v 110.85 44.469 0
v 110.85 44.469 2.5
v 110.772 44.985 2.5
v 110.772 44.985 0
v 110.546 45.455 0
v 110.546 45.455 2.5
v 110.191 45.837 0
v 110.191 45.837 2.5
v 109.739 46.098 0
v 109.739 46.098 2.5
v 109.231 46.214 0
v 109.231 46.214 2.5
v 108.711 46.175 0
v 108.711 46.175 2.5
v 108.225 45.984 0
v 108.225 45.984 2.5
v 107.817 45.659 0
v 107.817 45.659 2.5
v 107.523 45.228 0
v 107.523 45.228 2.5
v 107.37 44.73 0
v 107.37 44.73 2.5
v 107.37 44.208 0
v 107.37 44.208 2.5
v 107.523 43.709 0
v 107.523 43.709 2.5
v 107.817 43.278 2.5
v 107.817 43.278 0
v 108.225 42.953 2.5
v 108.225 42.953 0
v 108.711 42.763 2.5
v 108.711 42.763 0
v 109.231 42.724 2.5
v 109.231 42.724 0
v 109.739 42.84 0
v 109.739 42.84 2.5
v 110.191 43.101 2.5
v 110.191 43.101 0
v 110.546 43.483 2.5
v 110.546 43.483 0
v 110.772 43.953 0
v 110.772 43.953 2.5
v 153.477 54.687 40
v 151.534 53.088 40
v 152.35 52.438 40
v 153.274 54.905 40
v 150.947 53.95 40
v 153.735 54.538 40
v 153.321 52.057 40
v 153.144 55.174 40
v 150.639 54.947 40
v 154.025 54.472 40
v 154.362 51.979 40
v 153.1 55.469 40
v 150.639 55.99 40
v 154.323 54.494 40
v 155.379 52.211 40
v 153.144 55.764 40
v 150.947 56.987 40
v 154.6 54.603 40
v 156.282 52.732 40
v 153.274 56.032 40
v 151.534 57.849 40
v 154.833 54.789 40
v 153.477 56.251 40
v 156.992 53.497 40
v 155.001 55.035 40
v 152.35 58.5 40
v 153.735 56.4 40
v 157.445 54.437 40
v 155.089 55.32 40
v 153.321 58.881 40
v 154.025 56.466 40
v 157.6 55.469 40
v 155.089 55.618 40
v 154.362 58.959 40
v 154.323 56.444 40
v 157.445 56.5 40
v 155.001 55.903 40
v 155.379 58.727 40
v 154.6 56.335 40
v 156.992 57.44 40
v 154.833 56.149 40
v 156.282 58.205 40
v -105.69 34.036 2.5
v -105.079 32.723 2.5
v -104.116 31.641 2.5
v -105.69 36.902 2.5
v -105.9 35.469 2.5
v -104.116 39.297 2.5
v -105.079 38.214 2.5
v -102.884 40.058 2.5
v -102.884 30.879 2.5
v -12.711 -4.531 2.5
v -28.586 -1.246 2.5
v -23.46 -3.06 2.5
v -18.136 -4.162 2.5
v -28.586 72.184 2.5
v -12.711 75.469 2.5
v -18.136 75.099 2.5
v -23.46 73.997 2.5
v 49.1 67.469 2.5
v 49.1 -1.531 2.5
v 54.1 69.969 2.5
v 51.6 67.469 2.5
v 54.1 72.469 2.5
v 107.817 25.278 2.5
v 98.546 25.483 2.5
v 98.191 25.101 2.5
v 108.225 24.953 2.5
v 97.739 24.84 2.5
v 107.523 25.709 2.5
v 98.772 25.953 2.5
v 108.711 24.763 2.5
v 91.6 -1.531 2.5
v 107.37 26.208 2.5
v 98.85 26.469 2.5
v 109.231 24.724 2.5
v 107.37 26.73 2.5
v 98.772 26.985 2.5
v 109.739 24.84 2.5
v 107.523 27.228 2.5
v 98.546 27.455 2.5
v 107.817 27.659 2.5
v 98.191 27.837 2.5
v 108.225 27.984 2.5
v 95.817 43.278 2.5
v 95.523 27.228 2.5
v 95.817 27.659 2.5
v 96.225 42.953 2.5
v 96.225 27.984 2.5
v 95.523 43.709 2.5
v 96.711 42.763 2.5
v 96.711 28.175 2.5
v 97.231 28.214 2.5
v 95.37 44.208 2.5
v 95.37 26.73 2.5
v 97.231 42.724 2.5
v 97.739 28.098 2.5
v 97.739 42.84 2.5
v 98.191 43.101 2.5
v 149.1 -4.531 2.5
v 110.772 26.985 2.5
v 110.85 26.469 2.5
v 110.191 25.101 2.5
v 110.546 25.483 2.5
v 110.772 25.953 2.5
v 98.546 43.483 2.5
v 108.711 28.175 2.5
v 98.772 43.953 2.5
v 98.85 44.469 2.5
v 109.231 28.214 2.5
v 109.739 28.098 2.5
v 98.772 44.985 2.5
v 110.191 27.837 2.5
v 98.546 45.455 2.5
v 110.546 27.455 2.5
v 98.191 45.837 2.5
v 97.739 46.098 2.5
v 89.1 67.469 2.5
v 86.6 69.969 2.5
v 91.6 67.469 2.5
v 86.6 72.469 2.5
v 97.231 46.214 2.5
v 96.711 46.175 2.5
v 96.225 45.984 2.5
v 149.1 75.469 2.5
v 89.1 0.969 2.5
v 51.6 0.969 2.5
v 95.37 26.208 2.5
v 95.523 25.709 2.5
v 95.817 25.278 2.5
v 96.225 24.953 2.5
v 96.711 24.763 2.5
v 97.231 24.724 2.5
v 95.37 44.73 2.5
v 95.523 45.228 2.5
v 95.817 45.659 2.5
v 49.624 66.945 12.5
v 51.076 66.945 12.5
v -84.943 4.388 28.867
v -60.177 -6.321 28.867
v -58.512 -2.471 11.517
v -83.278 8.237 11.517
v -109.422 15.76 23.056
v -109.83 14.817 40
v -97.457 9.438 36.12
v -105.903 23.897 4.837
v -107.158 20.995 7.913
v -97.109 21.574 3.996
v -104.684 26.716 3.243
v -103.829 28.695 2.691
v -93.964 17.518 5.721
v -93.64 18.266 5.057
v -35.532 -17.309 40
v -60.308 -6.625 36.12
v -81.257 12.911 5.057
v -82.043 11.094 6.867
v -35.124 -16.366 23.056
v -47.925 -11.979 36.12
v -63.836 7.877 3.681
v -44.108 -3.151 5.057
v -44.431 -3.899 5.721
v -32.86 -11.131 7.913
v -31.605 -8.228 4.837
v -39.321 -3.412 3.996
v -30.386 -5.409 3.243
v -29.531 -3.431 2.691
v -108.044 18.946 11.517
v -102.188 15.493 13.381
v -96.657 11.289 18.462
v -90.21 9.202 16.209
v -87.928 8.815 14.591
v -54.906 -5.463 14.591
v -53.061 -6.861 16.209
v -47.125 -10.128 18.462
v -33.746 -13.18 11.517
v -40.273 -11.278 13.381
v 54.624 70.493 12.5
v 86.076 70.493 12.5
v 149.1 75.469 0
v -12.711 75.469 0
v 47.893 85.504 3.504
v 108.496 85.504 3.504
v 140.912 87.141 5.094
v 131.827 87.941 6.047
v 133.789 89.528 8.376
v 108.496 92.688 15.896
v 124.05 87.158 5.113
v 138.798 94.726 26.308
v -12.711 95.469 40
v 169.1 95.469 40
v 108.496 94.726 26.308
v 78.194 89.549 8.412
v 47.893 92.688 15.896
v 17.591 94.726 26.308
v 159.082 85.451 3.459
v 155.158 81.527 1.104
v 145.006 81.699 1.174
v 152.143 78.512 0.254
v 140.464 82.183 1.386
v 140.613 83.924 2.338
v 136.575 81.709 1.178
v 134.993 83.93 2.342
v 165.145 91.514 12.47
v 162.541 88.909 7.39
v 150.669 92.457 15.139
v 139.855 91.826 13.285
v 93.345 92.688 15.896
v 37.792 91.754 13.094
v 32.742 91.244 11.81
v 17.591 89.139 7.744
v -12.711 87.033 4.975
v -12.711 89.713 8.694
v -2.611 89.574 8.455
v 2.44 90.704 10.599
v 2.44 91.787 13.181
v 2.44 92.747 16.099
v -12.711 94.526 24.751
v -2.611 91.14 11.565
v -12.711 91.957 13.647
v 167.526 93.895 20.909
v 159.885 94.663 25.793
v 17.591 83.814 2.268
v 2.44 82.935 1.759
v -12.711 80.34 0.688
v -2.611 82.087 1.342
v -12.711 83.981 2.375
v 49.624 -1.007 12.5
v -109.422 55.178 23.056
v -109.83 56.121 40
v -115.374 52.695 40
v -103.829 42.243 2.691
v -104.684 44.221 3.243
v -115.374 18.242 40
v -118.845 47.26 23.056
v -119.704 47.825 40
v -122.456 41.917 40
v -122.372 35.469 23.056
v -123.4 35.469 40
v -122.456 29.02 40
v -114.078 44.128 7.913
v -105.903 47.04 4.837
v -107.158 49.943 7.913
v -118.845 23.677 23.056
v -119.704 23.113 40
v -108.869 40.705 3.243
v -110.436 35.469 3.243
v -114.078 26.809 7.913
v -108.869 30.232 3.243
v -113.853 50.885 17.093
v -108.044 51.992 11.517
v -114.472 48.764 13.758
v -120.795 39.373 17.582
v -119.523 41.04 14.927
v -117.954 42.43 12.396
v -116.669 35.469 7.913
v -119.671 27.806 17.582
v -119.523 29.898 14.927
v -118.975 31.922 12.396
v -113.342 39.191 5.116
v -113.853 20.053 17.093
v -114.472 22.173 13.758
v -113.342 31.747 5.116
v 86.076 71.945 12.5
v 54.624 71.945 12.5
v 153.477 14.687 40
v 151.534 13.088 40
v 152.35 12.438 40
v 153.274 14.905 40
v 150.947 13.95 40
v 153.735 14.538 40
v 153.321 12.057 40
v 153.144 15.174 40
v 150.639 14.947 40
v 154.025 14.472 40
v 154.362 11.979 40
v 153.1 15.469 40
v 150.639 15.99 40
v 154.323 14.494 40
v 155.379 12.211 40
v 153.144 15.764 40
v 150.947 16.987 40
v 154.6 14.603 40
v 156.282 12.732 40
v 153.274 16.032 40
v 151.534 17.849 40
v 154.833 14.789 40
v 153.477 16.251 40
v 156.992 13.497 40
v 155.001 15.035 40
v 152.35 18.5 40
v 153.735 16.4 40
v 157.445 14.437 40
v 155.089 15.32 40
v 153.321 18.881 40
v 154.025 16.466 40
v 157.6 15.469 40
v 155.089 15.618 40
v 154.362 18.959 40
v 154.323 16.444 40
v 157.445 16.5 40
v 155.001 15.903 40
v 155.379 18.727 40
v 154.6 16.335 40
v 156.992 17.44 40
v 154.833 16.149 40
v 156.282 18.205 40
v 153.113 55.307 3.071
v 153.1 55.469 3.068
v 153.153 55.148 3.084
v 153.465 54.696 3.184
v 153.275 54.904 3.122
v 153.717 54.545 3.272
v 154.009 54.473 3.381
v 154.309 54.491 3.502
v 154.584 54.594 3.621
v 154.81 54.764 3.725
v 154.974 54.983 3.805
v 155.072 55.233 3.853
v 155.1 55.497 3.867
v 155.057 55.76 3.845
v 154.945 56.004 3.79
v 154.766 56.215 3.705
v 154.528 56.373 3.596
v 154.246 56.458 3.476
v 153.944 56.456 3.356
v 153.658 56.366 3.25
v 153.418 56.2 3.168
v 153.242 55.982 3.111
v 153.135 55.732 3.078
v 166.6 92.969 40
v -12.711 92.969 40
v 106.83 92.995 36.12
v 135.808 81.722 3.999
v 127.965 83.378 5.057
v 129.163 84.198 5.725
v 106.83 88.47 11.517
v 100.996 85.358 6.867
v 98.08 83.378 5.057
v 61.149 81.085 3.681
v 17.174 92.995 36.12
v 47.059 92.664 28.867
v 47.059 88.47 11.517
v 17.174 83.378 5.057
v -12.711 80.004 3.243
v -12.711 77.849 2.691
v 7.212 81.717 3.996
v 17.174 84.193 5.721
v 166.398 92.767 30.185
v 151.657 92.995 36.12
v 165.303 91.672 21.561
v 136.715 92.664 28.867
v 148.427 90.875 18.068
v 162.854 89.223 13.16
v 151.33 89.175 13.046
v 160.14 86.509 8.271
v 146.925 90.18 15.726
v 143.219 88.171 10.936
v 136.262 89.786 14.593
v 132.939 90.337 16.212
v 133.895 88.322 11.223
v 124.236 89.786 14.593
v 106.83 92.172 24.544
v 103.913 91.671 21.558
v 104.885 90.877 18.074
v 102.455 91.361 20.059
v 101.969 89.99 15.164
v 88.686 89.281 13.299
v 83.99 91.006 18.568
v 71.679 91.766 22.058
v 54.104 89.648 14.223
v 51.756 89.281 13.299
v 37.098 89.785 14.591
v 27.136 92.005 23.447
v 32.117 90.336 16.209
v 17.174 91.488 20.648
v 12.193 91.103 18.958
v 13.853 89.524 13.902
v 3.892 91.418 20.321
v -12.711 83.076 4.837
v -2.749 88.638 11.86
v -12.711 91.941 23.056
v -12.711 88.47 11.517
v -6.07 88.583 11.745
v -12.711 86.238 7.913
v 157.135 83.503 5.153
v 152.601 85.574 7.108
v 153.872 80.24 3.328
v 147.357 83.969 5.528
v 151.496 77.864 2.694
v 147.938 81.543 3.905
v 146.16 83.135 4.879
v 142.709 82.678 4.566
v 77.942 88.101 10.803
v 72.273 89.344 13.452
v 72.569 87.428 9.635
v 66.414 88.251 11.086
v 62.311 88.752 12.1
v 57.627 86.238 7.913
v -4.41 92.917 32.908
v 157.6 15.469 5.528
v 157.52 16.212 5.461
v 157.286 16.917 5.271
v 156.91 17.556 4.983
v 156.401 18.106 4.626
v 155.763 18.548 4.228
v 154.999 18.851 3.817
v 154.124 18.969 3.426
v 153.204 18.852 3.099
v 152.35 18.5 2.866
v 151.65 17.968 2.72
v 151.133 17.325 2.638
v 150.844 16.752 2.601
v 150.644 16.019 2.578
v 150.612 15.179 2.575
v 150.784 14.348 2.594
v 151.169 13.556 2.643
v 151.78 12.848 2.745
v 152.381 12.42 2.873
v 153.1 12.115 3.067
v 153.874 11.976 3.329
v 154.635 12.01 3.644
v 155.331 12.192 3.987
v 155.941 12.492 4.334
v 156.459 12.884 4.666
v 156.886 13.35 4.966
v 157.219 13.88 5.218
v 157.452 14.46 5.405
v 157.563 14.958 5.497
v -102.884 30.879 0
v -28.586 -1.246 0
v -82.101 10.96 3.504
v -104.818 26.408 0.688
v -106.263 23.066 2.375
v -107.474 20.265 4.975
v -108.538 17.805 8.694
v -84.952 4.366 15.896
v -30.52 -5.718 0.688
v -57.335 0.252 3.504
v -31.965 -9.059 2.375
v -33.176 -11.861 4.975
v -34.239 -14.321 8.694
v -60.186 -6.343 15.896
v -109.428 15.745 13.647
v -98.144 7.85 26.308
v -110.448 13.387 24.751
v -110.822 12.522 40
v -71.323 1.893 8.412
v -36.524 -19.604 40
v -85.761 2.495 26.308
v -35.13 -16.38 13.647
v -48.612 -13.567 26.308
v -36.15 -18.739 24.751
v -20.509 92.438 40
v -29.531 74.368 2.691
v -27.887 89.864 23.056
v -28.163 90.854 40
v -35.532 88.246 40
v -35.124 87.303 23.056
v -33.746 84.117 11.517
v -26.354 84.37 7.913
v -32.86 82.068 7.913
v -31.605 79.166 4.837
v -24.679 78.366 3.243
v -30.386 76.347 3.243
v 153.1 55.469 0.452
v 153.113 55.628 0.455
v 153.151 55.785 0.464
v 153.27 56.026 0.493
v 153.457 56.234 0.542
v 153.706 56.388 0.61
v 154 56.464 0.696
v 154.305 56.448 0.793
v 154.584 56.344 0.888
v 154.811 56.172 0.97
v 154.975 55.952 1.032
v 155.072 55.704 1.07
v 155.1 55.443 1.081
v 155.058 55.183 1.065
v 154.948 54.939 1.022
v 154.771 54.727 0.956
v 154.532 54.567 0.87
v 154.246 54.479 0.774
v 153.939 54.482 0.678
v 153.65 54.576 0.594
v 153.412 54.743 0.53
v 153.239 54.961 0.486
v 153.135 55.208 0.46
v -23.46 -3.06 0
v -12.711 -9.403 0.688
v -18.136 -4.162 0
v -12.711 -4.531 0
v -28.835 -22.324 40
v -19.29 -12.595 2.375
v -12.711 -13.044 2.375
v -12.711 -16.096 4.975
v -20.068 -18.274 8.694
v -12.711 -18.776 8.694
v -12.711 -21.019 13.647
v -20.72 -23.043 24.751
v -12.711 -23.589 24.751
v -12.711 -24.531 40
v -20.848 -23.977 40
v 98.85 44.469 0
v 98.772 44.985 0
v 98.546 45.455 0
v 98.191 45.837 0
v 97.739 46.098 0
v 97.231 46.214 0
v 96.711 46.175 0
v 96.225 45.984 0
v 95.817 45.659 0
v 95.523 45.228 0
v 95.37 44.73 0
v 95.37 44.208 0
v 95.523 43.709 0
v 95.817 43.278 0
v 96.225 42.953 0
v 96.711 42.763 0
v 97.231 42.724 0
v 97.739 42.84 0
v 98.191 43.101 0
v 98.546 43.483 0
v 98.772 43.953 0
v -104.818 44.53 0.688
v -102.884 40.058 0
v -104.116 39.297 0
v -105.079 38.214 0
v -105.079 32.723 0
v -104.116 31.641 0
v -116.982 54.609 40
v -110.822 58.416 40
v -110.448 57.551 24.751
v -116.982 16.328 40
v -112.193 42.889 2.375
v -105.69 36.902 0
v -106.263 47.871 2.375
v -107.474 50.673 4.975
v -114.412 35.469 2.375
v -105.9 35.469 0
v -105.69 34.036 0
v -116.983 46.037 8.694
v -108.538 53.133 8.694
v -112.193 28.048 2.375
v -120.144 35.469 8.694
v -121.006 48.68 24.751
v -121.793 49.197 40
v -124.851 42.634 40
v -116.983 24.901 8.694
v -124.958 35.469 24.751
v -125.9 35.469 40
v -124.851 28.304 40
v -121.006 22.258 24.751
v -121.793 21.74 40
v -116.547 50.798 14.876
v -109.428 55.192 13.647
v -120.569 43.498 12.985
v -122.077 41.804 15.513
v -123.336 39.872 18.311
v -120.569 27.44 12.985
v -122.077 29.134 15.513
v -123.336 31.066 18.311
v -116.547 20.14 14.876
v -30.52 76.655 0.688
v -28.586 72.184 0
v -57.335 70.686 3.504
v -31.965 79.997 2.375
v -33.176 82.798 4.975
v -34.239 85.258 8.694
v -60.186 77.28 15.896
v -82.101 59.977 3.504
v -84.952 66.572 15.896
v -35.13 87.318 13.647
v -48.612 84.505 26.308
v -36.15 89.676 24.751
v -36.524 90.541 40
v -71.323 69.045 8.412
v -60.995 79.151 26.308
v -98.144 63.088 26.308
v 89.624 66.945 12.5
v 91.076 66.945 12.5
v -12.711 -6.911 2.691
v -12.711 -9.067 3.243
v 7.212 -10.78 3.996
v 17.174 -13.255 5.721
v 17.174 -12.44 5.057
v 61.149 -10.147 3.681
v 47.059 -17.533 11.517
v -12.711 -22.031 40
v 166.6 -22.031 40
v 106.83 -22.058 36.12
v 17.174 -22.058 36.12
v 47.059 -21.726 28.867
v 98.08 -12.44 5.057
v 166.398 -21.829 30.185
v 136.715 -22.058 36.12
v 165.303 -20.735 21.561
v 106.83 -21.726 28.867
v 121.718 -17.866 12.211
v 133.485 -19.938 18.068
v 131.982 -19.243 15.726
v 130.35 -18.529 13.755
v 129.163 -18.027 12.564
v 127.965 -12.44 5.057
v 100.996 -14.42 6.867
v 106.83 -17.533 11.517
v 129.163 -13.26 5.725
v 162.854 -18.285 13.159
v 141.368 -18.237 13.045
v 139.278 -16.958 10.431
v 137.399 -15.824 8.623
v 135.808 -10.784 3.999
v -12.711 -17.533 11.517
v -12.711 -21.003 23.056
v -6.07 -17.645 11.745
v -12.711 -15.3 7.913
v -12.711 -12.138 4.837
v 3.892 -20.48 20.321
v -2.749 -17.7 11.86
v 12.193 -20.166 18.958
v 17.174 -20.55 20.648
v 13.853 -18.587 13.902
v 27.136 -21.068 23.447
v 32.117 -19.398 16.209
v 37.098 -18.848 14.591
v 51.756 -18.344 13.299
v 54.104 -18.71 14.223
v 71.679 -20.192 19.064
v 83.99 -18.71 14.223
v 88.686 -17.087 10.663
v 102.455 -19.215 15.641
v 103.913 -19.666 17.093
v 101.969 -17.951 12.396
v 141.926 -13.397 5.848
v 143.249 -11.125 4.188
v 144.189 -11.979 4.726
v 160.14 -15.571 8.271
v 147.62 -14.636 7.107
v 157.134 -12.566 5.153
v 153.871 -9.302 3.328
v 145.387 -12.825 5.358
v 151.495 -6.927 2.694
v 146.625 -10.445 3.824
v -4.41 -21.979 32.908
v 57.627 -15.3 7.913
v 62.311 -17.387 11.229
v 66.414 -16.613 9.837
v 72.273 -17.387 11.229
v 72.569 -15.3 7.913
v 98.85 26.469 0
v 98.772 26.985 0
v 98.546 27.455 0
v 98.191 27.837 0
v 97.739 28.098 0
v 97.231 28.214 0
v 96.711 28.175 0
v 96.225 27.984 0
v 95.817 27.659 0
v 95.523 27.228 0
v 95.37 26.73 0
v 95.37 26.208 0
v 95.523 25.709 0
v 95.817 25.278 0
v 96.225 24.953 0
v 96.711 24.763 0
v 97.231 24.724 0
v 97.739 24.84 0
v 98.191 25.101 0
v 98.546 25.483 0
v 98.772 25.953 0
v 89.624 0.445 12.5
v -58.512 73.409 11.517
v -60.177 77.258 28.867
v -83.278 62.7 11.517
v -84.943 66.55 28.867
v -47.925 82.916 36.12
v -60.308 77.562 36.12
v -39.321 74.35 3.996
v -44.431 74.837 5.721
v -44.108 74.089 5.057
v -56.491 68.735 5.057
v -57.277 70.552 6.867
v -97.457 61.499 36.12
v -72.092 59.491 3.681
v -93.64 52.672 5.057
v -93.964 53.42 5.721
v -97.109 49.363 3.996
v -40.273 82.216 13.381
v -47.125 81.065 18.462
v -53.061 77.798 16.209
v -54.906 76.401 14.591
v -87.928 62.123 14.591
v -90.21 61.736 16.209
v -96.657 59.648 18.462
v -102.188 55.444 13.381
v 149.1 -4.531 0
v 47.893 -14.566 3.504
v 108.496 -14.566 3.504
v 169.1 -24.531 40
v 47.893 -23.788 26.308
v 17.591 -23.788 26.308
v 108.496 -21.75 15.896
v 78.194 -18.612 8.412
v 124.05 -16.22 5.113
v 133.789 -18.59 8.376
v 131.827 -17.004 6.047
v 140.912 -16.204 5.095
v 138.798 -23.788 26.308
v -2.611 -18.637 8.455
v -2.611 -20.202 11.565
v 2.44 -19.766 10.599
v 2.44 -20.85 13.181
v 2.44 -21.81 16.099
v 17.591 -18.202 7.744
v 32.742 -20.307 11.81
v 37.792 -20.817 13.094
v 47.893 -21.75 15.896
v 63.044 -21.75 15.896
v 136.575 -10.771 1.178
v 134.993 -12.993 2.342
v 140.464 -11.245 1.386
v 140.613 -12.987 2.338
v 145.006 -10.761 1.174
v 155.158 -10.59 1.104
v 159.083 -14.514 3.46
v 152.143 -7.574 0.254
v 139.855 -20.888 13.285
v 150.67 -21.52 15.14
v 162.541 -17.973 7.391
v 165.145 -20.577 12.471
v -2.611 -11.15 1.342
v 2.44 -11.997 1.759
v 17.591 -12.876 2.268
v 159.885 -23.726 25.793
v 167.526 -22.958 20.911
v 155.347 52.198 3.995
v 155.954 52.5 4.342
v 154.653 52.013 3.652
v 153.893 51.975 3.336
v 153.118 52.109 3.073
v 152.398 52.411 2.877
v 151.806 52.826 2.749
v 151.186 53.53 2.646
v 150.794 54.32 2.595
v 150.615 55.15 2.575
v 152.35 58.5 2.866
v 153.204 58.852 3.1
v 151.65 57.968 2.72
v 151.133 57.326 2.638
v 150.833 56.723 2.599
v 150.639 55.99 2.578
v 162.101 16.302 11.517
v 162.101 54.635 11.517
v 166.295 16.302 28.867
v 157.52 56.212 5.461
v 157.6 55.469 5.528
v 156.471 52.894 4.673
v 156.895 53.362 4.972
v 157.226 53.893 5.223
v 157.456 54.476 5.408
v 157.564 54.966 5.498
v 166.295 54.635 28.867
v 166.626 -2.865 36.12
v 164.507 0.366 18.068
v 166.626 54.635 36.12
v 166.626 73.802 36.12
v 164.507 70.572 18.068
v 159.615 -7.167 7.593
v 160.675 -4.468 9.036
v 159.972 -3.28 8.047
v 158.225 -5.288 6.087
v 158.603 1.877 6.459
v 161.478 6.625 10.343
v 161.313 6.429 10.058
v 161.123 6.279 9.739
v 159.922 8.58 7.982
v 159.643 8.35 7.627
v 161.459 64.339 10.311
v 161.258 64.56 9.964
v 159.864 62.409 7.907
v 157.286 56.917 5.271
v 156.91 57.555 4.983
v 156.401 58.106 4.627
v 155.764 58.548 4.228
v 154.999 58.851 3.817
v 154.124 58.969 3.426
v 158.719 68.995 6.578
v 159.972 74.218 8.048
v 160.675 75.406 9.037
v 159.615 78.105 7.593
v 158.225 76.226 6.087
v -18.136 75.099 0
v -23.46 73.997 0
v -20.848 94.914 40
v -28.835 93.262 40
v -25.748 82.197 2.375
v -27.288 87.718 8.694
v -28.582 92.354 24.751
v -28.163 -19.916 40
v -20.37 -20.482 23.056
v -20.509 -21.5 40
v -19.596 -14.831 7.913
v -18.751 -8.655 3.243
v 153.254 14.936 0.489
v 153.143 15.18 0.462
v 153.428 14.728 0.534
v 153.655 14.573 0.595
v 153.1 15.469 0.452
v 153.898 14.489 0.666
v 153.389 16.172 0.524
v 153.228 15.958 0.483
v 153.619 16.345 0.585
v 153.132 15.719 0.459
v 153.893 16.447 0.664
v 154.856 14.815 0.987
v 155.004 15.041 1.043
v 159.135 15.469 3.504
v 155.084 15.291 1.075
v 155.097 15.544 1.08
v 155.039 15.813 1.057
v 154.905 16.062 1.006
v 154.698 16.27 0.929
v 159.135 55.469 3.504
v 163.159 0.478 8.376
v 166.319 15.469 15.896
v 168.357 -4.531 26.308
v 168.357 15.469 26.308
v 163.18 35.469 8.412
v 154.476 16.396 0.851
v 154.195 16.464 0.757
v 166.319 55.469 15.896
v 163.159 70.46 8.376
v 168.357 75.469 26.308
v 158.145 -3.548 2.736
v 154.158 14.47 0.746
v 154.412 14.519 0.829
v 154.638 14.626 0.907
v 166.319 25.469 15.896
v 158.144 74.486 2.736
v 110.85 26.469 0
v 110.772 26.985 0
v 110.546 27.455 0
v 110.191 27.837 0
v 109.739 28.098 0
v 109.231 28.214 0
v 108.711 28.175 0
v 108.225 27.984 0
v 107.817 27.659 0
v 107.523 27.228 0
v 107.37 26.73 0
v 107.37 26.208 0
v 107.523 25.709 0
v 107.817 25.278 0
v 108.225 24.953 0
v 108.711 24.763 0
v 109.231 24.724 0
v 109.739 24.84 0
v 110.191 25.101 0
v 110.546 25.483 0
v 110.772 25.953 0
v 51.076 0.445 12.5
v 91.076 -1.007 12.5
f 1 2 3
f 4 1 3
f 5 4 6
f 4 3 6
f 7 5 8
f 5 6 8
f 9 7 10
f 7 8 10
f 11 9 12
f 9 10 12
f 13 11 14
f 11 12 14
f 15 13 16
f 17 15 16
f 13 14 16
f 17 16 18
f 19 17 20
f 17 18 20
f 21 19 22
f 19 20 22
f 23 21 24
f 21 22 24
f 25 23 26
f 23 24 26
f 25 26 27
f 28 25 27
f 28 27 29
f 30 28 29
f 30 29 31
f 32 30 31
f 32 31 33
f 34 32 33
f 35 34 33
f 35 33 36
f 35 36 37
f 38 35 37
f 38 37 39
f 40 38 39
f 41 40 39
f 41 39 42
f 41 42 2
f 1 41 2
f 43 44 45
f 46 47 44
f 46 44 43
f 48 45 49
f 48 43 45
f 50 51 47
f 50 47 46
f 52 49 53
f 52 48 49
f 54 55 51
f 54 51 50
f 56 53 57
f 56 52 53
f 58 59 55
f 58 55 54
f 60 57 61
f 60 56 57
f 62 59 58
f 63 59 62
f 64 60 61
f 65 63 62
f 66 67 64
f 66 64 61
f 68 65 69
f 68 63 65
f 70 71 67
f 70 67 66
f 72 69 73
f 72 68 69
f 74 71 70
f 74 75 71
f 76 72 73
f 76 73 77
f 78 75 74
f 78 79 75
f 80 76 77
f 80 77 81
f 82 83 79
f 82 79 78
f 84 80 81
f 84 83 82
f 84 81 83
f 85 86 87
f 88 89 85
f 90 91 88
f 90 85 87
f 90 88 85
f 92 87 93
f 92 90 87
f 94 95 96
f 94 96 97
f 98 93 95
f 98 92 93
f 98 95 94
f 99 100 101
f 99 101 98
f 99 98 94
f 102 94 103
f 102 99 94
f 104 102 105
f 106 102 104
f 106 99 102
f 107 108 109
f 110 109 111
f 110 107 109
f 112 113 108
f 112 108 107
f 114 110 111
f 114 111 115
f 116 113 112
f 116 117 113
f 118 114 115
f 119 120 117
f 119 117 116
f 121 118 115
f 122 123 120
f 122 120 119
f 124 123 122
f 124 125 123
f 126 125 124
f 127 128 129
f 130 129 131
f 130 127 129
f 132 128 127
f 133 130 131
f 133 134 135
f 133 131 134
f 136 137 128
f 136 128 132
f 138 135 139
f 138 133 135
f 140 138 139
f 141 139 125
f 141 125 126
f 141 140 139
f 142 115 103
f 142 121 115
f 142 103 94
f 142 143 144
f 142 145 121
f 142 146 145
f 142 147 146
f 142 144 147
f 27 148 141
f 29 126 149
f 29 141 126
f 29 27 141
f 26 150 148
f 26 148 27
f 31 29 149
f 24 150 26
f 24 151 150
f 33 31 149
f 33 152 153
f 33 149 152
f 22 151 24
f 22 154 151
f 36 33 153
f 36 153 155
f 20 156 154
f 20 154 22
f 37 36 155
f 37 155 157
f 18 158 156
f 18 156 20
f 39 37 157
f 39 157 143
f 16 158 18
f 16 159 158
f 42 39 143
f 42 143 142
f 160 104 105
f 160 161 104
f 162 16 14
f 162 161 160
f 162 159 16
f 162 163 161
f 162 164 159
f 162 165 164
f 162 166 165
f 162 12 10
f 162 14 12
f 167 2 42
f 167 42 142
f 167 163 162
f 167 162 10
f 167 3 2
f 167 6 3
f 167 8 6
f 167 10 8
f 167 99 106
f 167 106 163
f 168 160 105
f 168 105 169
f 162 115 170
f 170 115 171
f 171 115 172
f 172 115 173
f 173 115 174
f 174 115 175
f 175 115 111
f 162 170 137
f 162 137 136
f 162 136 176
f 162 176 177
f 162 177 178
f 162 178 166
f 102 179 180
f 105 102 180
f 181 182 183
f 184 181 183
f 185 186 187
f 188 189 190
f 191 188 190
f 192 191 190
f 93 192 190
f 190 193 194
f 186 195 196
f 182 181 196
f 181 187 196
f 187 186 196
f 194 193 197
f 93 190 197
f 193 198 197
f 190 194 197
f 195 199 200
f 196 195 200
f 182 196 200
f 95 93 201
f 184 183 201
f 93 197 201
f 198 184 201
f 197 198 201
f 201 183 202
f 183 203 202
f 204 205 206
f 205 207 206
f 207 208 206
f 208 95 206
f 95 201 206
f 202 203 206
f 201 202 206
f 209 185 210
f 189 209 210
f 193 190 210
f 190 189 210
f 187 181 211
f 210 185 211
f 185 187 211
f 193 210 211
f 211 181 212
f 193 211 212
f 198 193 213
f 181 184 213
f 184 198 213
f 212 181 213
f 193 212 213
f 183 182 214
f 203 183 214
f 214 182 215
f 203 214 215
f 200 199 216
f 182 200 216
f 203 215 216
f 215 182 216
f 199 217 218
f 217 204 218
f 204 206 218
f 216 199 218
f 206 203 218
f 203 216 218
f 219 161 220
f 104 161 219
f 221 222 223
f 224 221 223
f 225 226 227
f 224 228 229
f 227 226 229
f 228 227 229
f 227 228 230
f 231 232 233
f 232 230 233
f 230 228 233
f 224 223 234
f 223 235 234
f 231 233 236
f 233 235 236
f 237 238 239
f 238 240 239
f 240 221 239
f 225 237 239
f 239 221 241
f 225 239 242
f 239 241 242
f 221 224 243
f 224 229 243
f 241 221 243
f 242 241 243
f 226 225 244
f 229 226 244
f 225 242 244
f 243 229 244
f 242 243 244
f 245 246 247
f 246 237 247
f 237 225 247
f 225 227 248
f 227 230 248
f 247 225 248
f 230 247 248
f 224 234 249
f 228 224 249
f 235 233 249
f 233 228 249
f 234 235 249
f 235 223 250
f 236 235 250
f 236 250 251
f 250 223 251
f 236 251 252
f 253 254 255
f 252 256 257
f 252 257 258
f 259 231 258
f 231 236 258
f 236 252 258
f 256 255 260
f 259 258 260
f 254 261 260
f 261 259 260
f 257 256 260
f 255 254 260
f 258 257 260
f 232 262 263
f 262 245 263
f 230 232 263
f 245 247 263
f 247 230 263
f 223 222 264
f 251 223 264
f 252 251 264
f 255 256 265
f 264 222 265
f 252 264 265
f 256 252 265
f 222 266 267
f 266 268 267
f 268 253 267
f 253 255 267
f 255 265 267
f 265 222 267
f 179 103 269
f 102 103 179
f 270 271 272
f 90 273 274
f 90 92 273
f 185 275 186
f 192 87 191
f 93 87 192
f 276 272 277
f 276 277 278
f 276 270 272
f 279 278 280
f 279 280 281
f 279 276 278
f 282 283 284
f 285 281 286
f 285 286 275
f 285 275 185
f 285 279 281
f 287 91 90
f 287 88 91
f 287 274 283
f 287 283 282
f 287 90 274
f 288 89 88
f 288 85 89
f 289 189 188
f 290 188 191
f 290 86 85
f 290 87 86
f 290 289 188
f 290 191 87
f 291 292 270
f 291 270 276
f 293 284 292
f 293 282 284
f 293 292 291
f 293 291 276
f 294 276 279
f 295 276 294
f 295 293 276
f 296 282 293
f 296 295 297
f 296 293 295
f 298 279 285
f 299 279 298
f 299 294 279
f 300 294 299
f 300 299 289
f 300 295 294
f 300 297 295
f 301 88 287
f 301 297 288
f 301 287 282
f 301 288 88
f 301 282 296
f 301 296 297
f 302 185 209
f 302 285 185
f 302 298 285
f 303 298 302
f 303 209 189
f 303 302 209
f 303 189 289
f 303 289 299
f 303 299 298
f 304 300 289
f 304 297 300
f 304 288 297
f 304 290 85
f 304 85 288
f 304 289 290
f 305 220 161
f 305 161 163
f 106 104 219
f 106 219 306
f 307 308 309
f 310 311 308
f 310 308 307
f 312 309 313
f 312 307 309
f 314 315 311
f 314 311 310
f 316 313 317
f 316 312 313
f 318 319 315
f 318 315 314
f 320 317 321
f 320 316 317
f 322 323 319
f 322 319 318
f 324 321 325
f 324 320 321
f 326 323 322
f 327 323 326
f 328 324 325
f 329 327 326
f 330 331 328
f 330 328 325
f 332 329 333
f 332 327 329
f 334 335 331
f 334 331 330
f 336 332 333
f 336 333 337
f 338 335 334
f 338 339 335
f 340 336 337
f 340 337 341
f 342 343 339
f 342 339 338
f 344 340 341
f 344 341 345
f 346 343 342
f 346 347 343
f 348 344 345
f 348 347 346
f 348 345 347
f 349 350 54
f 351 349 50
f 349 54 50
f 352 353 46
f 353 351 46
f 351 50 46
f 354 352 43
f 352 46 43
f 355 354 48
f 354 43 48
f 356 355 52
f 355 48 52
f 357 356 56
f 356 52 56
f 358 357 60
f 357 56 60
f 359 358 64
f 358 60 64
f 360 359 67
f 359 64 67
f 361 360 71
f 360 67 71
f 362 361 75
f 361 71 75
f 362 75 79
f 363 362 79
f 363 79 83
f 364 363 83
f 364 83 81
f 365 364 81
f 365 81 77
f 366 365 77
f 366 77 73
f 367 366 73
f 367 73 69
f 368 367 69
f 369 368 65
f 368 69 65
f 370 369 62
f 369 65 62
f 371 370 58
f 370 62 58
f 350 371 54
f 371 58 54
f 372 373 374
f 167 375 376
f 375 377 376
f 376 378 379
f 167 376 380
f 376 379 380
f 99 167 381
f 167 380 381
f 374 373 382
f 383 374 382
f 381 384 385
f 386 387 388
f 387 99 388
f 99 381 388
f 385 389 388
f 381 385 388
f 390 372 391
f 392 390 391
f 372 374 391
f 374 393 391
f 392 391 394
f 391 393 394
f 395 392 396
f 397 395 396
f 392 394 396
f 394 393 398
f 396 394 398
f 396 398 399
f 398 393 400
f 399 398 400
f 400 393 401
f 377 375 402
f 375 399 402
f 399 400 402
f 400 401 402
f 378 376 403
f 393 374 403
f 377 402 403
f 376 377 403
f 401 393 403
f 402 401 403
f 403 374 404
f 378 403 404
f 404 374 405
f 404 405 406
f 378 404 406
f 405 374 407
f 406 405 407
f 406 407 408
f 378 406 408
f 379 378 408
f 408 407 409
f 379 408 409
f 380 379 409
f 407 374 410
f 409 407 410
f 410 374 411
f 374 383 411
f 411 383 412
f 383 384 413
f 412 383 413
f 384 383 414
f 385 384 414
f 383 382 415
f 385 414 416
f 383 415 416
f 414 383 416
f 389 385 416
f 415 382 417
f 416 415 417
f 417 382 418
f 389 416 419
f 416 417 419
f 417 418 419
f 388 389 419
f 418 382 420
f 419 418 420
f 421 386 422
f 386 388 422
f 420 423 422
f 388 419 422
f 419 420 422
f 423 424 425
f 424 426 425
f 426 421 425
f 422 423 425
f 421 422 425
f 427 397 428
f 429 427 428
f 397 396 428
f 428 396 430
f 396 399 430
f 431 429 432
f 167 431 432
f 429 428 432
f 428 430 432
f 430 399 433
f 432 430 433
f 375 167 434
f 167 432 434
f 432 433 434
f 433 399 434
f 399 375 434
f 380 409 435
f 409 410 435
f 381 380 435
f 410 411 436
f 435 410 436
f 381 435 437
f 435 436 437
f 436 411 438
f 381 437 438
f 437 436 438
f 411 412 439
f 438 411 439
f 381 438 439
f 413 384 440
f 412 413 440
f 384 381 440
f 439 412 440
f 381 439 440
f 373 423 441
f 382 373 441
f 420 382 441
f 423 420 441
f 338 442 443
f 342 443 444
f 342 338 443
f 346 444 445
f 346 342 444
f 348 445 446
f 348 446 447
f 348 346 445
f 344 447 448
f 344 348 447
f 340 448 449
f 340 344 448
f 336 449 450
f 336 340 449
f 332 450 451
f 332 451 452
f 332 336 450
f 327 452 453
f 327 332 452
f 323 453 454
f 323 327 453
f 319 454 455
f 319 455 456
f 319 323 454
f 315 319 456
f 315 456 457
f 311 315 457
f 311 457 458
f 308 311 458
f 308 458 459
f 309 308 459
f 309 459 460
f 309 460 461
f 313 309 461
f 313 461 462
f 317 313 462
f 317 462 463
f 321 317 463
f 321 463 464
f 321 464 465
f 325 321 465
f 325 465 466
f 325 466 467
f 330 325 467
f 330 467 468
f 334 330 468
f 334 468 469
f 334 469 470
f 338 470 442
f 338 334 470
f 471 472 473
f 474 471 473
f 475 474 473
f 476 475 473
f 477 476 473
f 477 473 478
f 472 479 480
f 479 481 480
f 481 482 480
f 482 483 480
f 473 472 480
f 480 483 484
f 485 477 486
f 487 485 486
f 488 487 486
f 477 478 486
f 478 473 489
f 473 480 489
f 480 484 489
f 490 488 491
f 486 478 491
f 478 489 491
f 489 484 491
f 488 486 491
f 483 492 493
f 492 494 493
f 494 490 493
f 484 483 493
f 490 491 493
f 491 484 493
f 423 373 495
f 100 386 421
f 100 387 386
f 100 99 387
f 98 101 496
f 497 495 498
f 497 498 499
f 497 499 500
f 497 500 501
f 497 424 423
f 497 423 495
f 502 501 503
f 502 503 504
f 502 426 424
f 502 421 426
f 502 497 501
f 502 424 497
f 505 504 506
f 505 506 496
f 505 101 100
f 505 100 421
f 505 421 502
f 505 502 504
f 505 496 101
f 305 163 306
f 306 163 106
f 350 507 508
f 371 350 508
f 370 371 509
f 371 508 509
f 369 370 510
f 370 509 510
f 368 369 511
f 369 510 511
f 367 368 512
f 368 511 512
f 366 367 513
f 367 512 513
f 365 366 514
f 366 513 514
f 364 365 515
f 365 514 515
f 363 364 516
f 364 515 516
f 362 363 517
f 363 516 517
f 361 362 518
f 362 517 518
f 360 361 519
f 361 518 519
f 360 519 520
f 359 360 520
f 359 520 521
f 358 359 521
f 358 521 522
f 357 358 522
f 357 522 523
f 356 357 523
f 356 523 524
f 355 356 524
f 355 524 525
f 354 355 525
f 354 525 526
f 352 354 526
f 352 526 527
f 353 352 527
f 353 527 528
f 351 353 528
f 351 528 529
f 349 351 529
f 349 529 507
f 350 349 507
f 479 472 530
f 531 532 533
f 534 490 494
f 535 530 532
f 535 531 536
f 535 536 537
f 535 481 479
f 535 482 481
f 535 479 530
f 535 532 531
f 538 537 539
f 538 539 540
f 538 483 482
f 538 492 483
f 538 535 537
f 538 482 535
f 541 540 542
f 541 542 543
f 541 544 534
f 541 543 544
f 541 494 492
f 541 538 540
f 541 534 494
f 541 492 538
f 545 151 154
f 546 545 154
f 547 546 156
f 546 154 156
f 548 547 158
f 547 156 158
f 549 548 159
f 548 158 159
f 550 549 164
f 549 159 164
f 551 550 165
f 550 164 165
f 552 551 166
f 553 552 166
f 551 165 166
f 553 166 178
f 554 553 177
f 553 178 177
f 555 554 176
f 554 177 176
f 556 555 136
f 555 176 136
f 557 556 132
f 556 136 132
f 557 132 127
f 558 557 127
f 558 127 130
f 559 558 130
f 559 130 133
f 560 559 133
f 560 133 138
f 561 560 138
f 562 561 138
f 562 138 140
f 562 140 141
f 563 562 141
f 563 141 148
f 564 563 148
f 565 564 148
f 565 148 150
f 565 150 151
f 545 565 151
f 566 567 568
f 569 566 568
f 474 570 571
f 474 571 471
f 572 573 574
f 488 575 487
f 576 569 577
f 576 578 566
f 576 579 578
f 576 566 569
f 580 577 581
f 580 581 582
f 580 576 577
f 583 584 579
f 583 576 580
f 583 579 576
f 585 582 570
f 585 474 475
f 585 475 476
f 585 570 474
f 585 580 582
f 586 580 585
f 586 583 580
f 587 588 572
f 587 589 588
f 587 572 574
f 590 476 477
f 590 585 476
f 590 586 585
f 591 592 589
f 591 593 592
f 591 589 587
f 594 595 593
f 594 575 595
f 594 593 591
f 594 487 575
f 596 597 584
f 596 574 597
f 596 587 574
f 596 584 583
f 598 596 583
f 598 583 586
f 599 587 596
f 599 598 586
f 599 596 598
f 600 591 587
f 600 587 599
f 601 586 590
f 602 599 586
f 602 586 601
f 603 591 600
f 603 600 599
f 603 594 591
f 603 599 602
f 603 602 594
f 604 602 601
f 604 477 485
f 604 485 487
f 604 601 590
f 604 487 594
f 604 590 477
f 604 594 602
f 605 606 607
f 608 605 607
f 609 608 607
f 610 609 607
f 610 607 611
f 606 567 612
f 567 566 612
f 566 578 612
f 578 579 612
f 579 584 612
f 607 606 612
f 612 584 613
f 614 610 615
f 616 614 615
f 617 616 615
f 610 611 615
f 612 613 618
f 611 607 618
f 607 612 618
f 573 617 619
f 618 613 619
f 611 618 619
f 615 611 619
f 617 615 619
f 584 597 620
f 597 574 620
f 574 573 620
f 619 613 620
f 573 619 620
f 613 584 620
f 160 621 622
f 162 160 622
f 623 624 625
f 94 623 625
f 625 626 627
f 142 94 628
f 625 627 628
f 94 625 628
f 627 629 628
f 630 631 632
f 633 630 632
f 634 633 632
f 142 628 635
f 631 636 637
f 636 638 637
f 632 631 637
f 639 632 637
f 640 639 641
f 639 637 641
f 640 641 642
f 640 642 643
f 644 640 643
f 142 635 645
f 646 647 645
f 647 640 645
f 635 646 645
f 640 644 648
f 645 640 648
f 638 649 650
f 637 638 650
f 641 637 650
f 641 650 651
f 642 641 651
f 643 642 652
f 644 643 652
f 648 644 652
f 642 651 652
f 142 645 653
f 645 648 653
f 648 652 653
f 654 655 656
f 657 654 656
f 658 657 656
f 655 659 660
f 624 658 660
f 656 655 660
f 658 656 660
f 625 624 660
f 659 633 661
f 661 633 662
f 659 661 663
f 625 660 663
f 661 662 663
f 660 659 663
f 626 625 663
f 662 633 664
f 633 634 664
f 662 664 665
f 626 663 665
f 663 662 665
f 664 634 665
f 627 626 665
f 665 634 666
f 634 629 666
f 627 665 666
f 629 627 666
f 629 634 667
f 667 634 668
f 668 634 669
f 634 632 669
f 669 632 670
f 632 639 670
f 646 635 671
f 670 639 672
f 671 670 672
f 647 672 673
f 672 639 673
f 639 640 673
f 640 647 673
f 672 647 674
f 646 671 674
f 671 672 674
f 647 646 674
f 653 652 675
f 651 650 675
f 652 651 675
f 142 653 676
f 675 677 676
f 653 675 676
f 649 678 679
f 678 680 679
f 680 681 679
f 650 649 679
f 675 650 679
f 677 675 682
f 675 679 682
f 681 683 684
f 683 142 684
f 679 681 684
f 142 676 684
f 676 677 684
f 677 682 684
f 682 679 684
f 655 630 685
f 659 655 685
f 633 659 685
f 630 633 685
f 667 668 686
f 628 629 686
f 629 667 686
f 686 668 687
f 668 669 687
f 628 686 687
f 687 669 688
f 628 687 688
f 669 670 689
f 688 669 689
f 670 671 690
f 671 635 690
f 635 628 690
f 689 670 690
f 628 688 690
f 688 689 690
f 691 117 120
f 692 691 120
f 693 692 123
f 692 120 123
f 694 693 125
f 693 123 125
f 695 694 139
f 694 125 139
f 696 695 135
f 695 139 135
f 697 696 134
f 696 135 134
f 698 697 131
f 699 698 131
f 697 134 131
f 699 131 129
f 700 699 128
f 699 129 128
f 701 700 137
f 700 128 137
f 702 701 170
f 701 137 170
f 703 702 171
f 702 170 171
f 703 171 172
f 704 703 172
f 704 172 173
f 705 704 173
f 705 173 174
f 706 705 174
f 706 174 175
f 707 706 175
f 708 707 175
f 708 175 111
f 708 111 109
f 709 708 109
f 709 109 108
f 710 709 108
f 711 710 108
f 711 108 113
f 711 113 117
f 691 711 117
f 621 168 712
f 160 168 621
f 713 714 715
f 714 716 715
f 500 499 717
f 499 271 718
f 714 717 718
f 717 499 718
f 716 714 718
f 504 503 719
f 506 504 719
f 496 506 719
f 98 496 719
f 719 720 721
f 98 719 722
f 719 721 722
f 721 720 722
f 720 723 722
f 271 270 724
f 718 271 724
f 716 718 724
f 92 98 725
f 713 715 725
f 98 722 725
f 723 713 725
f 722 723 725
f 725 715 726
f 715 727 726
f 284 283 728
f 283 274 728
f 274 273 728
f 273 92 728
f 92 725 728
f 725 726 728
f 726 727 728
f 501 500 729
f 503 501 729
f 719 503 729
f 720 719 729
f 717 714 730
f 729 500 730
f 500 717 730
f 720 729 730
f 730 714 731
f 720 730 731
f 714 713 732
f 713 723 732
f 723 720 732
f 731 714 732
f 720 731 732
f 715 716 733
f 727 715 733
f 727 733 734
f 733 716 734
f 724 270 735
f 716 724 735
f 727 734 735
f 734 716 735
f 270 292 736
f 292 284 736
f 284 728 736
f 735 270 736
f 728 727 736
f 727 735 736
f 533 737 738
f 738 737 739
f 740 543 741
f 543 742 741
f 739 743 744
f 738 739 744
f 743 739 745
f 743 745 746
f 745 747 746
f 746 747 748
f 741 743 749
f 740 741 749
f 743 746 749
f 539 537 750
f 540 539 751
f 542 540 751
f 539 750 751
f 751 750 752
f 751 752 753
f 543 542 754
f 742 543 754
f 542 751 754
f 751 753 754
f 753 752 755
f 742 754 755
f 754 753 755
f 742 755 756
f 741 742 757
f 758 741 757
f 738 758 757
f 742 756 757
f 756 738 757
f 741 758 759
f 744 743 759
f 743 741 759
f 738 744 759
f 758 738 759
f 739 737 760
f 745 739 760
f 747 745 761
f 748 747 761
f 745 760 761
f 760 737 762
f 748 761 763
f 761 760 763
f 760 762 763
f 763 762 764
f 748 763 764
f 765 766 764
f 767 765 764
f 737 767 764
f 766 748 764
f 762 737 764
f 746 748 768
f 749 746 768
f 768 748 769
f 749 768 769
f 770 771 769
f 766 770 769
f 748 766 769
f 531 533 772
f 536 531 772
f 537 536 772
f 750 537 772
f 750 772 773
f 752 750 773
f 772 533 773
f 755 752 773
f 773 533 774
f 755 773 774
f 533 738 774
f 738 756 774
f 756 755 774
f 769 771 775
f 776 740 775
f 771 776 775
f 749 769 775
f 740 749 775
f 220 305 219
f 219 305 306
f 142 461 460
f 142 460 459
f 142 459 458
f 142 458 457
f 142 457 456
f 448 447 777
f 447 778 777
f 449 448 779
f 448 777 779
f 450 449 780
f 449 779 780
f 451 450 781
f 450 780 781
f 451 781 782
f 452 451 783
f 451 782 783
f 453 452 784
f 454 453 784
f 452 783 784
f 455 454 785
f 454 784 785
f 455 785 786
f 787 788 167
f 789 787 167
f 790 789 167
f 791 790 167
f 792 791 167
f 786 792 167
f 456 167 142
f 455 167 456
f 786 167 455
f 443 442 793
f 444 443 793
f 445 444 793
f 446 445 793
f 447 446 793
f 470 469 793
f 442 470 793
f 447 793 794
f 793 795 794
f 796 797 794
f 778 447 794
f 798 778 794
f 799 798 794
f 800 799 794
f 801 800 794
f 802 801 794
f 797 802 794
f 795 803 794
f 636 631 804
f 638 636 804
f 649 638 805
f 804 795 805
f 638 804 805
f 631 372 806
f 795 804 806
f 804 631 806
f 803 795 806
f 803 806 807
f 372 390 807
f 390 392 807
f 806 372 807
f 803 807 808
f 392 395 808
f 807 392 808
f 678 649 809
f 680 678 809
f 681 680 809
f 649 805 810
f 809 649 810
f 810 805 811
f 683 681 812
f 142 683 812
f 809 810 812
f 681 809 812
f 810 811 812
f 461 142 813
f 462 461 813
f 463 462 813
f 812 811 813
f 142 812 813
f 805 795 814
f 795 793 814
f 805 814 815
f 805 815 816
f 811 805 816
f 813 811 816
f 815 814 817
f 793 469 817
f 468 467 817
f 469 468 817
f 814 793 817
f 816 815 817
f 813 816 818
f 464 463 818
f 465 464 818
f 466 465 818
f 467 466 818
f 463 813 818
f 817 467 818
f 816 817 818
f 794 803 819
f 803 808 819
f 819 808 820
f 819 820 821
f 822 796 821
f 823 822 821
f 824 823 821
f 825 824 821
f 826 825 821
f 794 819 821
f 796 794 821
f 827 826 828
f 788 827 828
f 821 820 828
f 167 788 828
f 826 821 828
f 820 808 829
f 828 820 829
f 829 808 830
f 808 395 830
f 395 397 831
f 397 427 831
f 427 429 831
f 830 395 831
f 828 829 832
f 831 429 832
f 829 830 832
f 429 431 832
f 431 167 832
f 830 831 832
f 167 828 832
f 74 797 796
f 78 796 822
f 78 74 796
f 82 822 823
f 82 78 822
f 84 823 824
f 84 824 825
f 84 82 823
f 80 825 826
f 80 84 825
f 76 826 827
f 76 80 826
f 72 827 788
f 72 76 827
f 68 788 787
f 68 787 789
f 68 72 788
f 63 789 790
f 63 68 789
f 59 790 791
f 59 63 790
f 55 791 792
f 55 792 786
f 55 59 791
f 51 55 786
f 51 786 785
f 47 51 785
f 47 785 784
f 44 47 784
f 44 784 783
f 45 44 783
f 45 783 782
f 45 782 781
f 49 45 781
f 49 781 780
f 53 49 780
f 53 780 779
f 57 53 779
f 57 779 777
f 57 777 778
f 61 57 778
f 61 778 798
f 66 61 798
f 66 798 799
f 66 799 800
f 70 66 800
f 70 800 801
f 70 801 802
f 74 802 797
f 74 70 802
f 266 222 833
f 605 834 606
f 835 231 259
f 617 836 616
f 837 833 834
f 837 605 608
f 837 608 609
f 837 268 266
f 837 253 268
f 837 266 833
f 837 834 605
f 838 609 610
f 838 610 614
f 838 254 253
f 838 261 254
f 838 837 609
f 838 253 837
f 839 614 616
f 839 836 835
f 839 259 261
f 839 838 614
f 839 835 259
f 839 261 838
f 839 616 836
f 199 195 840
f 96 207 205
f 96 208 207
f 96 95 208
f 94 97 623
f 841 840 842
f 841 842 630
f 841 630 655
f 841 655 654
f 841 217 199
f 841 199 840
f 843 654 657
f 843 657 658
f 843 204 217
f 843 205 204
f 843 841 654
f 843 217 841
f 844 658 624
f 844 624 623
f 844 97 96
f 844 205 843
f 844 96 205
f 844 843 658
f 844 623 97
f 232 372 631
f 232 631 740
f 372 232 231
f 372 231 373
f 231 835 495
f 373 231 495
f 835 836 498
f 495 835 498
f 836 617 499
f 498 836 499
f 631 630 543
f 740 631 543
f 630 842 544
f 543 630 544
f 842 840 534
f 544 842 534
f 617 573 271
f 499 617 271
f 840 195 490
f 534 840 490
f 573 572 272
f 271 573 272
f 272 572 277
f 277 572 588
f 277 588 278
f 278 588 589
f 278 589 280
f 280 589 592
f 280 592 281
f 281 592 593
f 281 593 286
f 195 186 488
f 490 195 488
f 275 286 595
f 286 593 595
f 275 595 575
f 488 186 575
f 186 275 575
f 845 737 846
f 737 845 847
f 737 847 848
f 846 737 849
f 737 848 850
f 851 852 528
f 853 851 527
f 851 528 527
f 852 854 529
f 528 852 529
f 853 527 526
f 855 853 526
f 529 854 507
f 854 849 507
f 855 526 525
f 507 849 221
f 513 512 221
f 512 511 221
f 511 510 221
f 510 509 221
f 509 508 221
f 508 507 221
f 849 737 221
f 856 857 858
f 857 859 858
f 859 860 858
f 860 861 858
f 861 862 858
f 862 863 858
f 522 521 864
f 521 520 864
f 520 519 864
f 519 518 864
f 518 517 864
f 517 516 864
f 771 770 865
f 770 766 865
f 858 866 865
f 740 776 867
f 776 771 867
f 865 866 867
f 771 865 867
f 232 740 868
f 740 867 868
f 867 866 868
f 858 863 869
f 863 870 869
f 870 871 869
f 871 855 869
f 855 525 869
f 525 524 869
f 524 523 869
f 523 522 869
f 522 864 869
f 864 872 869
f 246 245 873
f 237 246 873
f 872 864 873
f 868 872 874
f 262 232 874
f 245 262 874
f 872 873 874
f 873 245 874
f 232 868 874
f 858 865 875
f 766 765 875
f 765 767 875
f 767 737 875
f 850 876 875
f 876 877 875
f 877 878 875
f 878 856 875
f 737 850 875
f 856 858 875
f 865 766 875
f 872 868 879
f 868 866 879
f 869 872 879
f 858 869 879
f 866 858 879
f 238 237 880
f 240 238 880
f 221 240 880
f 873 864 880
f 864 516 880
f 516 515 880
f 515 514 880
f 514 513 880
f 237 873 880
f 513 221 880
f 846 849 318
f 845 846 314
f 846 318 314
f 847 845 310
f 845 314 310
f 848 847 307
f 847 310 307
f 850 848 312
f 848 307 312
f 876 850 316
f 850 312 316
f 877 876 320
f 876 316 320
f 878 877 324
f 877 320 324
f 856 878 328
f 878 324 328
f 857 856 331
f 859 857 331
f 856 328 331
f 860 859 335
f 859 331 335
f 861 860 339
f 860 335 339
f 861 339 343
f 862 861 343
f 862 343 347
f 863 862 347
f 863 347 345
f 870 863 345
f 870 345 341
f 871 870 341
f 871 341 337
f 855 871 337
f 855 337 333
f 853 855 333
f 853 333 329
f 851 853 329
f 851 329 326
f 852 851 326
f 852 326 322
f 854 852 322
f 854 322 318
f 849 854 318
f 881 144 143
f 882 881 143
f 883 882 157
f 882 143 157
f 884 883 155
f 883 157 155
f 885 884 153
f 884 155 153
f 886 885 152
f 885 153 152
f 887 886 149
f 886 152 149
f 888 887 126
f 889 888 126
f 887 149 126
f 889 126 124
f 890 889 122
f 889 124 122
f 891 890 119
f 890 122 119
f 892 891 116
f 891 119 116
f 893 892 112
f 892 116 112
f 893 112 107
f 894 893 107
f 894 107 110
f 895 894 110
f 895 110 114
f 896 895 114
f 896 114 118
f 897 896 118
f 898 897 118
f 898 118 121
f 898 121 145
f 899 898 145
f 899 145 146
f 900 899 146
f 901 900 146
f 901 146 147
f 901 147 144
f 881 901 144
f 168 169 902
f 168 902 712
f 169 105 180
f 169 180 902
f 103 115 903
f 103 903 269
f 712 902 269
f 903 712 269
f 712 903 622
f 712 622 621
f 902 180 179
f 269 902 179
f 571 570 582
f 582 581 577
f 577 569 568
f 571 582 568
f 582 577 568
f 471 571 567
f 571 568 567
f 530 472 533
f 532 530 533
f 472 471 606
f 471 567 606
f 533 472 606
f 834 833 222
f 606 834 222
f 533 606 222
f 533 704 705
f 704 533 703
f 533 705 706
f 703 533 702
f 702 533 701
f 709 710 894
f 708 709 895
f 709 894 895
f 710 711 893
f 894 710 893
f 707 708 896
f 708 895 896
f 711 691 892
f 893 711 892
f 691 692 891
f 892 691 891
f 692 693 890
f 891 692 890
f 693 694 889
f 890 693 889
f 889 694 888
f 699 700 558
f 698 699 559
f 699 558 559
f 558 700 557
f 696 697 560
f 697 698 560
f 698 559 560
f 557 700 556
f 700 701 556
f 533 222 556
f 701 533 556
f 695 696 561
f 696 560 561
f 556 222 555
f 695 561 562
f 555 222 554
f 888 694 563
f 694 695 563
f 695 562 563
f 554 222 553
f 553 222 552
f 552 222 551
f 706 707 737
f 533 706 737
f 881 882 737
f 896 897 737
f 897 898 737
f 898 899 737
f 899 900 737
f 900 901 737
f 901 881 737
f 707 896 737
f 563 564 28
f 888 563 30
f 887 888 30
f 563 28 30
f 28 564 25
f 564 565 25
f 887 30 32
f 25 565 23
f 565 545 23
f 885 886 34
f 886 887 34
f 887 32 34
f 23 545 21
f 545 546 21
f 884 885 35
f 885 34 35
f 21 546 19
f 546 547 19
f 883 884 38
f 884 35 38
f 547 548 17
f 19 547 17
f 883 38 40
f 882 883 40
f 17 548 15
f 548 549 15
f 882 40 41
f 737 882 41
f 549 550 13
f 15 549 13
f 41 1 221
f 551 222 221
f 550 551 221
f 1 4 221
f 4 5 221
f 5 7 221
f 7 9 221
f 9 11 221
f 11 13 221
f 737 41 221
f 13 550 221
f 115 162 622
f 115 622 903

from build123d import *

# Parameters (mm, degrees)
BOSS_EXTRU_1_DEPTH           = 2.5
ENL_V_MAT_EXTRU_1_REACH      = 169.131
ESQUISSE3_R                  = 1.75
BOSS_EXTRU_2_DEPTH           = 10
BOSS_EXTRU_2_DRAFT           = -3
ESQUISSE4_W                  = 32.5
ESQUISSE4_H                  = 2.5
BOSS_EXTRU_2_PROFILE_2_DEPTH = 10
BOSS_EXTRU_2_PROFILE_2_DRAFT = -3
ENL_V_MAT_EXTRU_2_REACH      = 200.265
ESQUISSE8_R                  = 1
BOSS_EXTRU_3_REACH           = 200.265
ESQUISSE9_R                  = 3.5
ESQUISSE9_R_2                = 1


with BuildPart() as part:
    # Esquisse1 → Boss.-Extru.1 (new body)
    with BuildSketch(Plane.XY):
        with BuildLine():
            Line((149.100058284, 75.46875), (-12.711143092, 75.46875))
            ThreePointArc((-12.711143092, 75.46875), (-20.816828901, 74.638864342), (-28.58617509, 72.183642878))
            Line((-28.58617509, 72.183642878), (-102.884320715, 40.05811161))
            ThreePointArc((-102.884320715, 40.05811161), (-105.899941716, 35.46875), (-102.884320715, 30.87938839))
            Line((-102.884320715, 30.87938839), (-28.58617509, -1.246142878))
            ThreePointArc((-28.58617509, -1.246142878), (-20.816828901, -3.701364342), (-12.711143092, -4.53125))
            Line((-12.711143092, -4.53125), (149.100058284, -4.53125))
            Line((149.100058284, -4.53125), (149.100058284, 75.46875))
        make_face()
    extrude(amount=BOSS_EXTRU_1_DEPTH)

    # Esquisse3 → Enlèv. mat.-Extru.1 (cut, up to next)
    with BuildSketch(Plane.XY.offset(2.5), mode=Mode.PRIVATE) as enl_v_mat_extru_1_sk1:
        with Locations((97.100058284, 44.46875)):
            Circle(ESQUISSE3_R)
    enl_v_mat_extru_1_tool1 = extrude(enl_v_mat_extru_1_sk1.sketch, amount=-ENL_V_MAT_EXTRU_1_REACH, mode=Mode.PRIVATE) & part.part
    # Esquisse3 → Enlèv. mat.-Extru.1 (cut, up to next)
    with BuildSketch(Plane.XY.offset(2.5), mode=Mode.PRIVATE) as enl_v_mat_extru_1_sk2:
        with Locations((97.100058284, 26.46875)):
            Circle(ESQUISSE3_R)
    enl_v_mat_extru_1_tool2 = extrude(enl_v_mat_extru_1_sk2.sketch, amount=-ENL_V_MAT_EXTRU_1_REACH, mode=Mode.PRIVATE) & part.part
    # Esquisse3 → Enlèv. mat.-Extru.1 (cut, up to next)
    with BuildSketch(Plane.XY.offset(2.5), mode=Mode.PRIVATE) as enl_v_mat_extru_1_sk3:
        with Locations((109.100058284, 26.46875)):
            Circle(ESQUISSE3_R)
    enl_v_mat_extru_1_tool3 = extrude(enl_v_mat_extru_1_sk3.sketch, amount=-ENL_V_MAT_EXTRU_1_REACH, mode=Mode.PRIVATE) & part.part
    # Esquisse3 → Enlèv. mat.-Extru.1 (cut, up to next)
    with BuildSketch(Plane.XY.offset(2.5), mode=Mode.PRIVATE) as enl_v_mat_extru_1_sk4:
        with Locations((109.100058284, 44.46875)):
            Circle(ESQUISSE3_R)
    enl_v_mat_extru_1_tool4 = extrude(enl_v_mat_extru_1_sk4.sketch, amount=-ENL_V_MAT_EXTRU_1_REACH, mode=Mode.PRIVATE) & part.part
    add(enl_v_mat_extru_1_tool1.solids().sort_by_distance((97.100058, 44.46875, 2.5))[0], mode=Mode.SUBTRACT)
    add(enl_v_mat_extru_1_tool2.solids().sort_by_distance((97.100058, 26.46875, 2.5))[0], mode=Mode.SUBTRACT)
    add(enl_v_mat_extru_1_tool3.solids().sort_by_distance((109.100058, 26.46875, 2.5))[0], mode=Mode.SUBTRACT)
    add(enl_v_mat_extru_1_tool4.solids().sort_by_distance((109.100058, 44.46875, 2.5))[0], mode=Mode.SUBTRACT)


with BuildPart() as boss_extru_2_tool:
    # Esquisse4 → Boss.-Extru.2 (with draft: the straight prism first)
    with BuildSketch(Plane(origin=(0, 0, 2.5), x_dir=(-1, 0, 0), z_dir=(0, 0, -1))):
        Polygon((-51.600058284, 0.96875), (-89.100058284, 0.96875), (-89.100058284, 67.46875), (-91.600058284, 67.46875), (-91.600058284, -1.53125), (-49.100058284, -1.53125), (-49.100058284, 67.46875), (-51.600058284, 67.46875), align=None)
    extrude(amount=-BOSS_EXTRU_2_DEPTH)
    # Boss.-Extru.2: the draft: its side faces are tilted about the plane it starts from
    boss_extru_2_sides = [boss_extru_2_tool.faces().sort_by_distance(p)[0] for p in [
        (70.350058284, 0.96875, 7.5),
        (89.100058284, 34.21875, 7.5),
        (90.350058284, 67.46875, 7.5),
        (91.600058284, 32.96875, 7.5),
        (70.350058284, -1.53125, 7.5),
        (49.100058284, 32.96875, 7.5),
        (50.350058284, 67.46875, 7.5),
        (51.600058284, 34.21875, 7.5),
    ]]
    draft(boss_extru_2_sides, Plane(origin=(0, 0, 2.5), x_dir=(-1, 0, 0), z_dir=(0, 0, -1)), BOSS_EXTRU_2_DRAFT)


with BuildPart() as part_1:
    add(part.part)

    # Boss.-Extru.2: add boss_extru_2_tool
    add(boss_extru_2_tool.part)


with BuildPart() as boss_extru_2_profile_2_tool:
    # Esquisse4 → Boss.-Extru.2 profile 2 (with draft: the straight prism first)
    with BuildSketch(Plane(origin=(0, 0, 2.5), x_dir=(-1, 0, 0), z_dir=(0, 0, -1))):
        with Locations((-70.350058284, 71.21875)):
            Rectangle(ESQUISSE4_W, ESQUISSE4_H)
    extrude(amount=-BOSS_EXTRU_2_PROFILE_2_DEPTH)
    # Boss.-Extru.2 profile 2: the draft: its side faces are tilted about the plane it starts from
    boss_extru_2_profile_2_sides = [boss_extru_2_profile_2_tool.faces().sort_by_distance(p)[0] for p in [
        (54.100058284, 71.21875, 7.5),
        (70.350058284, 72.46875, 7.5),
        (86.600058284, 71.21875, 7.5),
        (70.350058284, 69.96875, 7.5),
    ]]
    draft(boss_extru_2_profile_2_sides, Plane(origin=(0, 0, 2.5), x_dir=(-1, 0, 0), z_dir=(0, 0, -1)), BOSS_EXTRU_2_PROFILE_2_DRAFT)


with BuildPart() as part_2:
    add(part_1.part)

    # Boss.-Extru.2 profile 2: add boss_extru_2_profile_2_tool
    add(boss_extru_2_profile_2_tool.part)

    # Balayage1: sweep along a path in Esquisse5
    with BuildLine(Plane.XY.offset(2.5)) as balayage1_path:
        Line((149.100058284, 75.46875), (-12.711143092, 75.46875))
        ThreePointArc((-12.711143092, 75.46875), (-20.816828901, 74.638864342), (-28.58617509, 72.183642878))
        Line((-28.58617509, 72.183642878), (-102.884320715, 40.05811161))
        ThreePointArc((-102.884320715, 40.05811161), (-105.899941716, 35.46875), (-102.884320715, 30.87938839))
        Line((-102.884320715, 30.87938839), (-28.58617509, -1.246142878))
        ThreePointArc((-28.58617509, -1.246142878), (-20.816828901, -3.701364342), (-12.711143092, -4.53125))
        Line((-12.711143092, -4.53125), (149.100058284, -4.53125))
        Line((149.100058284, -4.53125), (149.100058284, 75.46875))
    # Esquisse7 → Balayage1 (sweep)
    with BuildSketch(Plane(origin=(149.100058284, 0, 0), x_dir=(0, 0, -1), z_dir=(1, 0, 0))):
        with BuildLine():
            Line((-2.5, 75.46875), (0, 75.46875))
            add(Edge.make_bspline(
                [(0, 75.46875), (0, 86.411621691), (-9.099638508, 95.407035507), (-40, 95.46875)],
                knots=[0, 0, 0, 0, 1, 1, 1, 1], degree=3))
            Line((-40, 95.46875), (-40, 92.96875))
            add(Edge.make_bspline(
                [(-40, 92.96875), (-36.824934583, 92.96875), (-2.5, 94.513588254), (-2.5, 75.46875)],
                knots=[0, 0, 0, 0, 1, 1, 1, 1], degree=3))
        make_face()
    sweep(path=balayage1_path.line, transition=Transition.RIGHT)

    # Esquisse8 → Enlèv. mat.-Extru.2 (cut, up to next)
    with BuildSketch(Plane(origin=(0, 0, 0), x_dir=(-1, 0, 0), z_dir=(0, 0, -1)), mode=Mode.PRIVATE) as enl_v_mat_extru_2_sk1:
        with Locations((-154.100058284, 55.46875)):
            Circle(ESQUISSE8_R)
    enl_v_mat_extru_2_tool1 = extrude(enl_v_mat_extru_2_sk1.sketch, amount=-ENL_V_MAT_EXTRU_2_REACH, mode=Mode.PRIVATE) & part_2.part
    # Esquisse8 → Enlèv. mat.-Extru.2 (cut, up to next)
    with BuildSketch(Plane(origin=(0, 0, 0), x_dir=(-1, 0, 0), z_dir=(0, 0, -1)), mode=Mode.PRIVATE) as enl_v_mat_extru_2_sk2:
        with Locations((-154.100058284, 15.46875)):
            Circle(ESQUISSE8_R)
    enl_v_mat_extru_2_tool2 = extrude(enl_v_mat_extru_2_sk2.sketch, amount=-ENL_V_MAT_EXTRU_2_REACH, mode=Mode.PRIVATE) & part_2.part
    add(enl_v_mat_extru_2_tool1.solids().sort_by_distance((154.100058, 55.46875, 0))[0], mode=Mode.SUBTRACT)
    add(enl_v_mat_extru_2_tool2.solids().sort_by_distance((154.100058, 15.46875, 0))[0], mode=Mode.SUBTRACT)

    # Esquisse9 → Boss.-Extru.3 (add, up to next)
    with BuildSketch(Plane.XY.offset(40), mode=Mode.PRIVATE) as boss_extru_3_sk1:
        with Locations((154.100058284, 15.46875)):
            Circle(ESQUISSE9_R)
        with Locations(Location((154.100058284, 15.46875, 0), (0, 0, 180))):
            Circle(ESQUISSE9_R_2, mode=Mode.SUBTRACT)
    boss_extru_3_tool1 = extrude(boss_extru_3_sk1.sketch, amount=-BOSS_EXTRU_3_REACH, mode=Mode.PRIVATE) - part_2.part
    # Esquisse9 → Boss.-Extru.3 (add, up to next)
    with BuildSketch(Plane.XY.offset(40), mode=Mode.PRIVATE) as boss_extru_3_sk2:
        with Locations((154.100058284, 55.46875)):
            Circle(ESQUISSE9_R)
        with Locations(Location((154.100058284, 55.46875, 0), (0, 0, 180))):
            Circle(ESQUISSE9_R_2, mode=Mode.SUBTRACT)
    boss_extru_3_tool2 = extrude(boss_extru_3_sk2.sketch, amount=-BOSS_EXTRU_3_REACH, mode=Mode.PRIVATE) - part_2.part
    add(boss_extru_3_tool1.solids().sort_by_distance((150.699053, 15.46875, 40))[0])
    add(boss_extru_3_tool2.solids().sort_by_distance((150.699053, 55.46875, 40))[0])


solid = part_2.part
